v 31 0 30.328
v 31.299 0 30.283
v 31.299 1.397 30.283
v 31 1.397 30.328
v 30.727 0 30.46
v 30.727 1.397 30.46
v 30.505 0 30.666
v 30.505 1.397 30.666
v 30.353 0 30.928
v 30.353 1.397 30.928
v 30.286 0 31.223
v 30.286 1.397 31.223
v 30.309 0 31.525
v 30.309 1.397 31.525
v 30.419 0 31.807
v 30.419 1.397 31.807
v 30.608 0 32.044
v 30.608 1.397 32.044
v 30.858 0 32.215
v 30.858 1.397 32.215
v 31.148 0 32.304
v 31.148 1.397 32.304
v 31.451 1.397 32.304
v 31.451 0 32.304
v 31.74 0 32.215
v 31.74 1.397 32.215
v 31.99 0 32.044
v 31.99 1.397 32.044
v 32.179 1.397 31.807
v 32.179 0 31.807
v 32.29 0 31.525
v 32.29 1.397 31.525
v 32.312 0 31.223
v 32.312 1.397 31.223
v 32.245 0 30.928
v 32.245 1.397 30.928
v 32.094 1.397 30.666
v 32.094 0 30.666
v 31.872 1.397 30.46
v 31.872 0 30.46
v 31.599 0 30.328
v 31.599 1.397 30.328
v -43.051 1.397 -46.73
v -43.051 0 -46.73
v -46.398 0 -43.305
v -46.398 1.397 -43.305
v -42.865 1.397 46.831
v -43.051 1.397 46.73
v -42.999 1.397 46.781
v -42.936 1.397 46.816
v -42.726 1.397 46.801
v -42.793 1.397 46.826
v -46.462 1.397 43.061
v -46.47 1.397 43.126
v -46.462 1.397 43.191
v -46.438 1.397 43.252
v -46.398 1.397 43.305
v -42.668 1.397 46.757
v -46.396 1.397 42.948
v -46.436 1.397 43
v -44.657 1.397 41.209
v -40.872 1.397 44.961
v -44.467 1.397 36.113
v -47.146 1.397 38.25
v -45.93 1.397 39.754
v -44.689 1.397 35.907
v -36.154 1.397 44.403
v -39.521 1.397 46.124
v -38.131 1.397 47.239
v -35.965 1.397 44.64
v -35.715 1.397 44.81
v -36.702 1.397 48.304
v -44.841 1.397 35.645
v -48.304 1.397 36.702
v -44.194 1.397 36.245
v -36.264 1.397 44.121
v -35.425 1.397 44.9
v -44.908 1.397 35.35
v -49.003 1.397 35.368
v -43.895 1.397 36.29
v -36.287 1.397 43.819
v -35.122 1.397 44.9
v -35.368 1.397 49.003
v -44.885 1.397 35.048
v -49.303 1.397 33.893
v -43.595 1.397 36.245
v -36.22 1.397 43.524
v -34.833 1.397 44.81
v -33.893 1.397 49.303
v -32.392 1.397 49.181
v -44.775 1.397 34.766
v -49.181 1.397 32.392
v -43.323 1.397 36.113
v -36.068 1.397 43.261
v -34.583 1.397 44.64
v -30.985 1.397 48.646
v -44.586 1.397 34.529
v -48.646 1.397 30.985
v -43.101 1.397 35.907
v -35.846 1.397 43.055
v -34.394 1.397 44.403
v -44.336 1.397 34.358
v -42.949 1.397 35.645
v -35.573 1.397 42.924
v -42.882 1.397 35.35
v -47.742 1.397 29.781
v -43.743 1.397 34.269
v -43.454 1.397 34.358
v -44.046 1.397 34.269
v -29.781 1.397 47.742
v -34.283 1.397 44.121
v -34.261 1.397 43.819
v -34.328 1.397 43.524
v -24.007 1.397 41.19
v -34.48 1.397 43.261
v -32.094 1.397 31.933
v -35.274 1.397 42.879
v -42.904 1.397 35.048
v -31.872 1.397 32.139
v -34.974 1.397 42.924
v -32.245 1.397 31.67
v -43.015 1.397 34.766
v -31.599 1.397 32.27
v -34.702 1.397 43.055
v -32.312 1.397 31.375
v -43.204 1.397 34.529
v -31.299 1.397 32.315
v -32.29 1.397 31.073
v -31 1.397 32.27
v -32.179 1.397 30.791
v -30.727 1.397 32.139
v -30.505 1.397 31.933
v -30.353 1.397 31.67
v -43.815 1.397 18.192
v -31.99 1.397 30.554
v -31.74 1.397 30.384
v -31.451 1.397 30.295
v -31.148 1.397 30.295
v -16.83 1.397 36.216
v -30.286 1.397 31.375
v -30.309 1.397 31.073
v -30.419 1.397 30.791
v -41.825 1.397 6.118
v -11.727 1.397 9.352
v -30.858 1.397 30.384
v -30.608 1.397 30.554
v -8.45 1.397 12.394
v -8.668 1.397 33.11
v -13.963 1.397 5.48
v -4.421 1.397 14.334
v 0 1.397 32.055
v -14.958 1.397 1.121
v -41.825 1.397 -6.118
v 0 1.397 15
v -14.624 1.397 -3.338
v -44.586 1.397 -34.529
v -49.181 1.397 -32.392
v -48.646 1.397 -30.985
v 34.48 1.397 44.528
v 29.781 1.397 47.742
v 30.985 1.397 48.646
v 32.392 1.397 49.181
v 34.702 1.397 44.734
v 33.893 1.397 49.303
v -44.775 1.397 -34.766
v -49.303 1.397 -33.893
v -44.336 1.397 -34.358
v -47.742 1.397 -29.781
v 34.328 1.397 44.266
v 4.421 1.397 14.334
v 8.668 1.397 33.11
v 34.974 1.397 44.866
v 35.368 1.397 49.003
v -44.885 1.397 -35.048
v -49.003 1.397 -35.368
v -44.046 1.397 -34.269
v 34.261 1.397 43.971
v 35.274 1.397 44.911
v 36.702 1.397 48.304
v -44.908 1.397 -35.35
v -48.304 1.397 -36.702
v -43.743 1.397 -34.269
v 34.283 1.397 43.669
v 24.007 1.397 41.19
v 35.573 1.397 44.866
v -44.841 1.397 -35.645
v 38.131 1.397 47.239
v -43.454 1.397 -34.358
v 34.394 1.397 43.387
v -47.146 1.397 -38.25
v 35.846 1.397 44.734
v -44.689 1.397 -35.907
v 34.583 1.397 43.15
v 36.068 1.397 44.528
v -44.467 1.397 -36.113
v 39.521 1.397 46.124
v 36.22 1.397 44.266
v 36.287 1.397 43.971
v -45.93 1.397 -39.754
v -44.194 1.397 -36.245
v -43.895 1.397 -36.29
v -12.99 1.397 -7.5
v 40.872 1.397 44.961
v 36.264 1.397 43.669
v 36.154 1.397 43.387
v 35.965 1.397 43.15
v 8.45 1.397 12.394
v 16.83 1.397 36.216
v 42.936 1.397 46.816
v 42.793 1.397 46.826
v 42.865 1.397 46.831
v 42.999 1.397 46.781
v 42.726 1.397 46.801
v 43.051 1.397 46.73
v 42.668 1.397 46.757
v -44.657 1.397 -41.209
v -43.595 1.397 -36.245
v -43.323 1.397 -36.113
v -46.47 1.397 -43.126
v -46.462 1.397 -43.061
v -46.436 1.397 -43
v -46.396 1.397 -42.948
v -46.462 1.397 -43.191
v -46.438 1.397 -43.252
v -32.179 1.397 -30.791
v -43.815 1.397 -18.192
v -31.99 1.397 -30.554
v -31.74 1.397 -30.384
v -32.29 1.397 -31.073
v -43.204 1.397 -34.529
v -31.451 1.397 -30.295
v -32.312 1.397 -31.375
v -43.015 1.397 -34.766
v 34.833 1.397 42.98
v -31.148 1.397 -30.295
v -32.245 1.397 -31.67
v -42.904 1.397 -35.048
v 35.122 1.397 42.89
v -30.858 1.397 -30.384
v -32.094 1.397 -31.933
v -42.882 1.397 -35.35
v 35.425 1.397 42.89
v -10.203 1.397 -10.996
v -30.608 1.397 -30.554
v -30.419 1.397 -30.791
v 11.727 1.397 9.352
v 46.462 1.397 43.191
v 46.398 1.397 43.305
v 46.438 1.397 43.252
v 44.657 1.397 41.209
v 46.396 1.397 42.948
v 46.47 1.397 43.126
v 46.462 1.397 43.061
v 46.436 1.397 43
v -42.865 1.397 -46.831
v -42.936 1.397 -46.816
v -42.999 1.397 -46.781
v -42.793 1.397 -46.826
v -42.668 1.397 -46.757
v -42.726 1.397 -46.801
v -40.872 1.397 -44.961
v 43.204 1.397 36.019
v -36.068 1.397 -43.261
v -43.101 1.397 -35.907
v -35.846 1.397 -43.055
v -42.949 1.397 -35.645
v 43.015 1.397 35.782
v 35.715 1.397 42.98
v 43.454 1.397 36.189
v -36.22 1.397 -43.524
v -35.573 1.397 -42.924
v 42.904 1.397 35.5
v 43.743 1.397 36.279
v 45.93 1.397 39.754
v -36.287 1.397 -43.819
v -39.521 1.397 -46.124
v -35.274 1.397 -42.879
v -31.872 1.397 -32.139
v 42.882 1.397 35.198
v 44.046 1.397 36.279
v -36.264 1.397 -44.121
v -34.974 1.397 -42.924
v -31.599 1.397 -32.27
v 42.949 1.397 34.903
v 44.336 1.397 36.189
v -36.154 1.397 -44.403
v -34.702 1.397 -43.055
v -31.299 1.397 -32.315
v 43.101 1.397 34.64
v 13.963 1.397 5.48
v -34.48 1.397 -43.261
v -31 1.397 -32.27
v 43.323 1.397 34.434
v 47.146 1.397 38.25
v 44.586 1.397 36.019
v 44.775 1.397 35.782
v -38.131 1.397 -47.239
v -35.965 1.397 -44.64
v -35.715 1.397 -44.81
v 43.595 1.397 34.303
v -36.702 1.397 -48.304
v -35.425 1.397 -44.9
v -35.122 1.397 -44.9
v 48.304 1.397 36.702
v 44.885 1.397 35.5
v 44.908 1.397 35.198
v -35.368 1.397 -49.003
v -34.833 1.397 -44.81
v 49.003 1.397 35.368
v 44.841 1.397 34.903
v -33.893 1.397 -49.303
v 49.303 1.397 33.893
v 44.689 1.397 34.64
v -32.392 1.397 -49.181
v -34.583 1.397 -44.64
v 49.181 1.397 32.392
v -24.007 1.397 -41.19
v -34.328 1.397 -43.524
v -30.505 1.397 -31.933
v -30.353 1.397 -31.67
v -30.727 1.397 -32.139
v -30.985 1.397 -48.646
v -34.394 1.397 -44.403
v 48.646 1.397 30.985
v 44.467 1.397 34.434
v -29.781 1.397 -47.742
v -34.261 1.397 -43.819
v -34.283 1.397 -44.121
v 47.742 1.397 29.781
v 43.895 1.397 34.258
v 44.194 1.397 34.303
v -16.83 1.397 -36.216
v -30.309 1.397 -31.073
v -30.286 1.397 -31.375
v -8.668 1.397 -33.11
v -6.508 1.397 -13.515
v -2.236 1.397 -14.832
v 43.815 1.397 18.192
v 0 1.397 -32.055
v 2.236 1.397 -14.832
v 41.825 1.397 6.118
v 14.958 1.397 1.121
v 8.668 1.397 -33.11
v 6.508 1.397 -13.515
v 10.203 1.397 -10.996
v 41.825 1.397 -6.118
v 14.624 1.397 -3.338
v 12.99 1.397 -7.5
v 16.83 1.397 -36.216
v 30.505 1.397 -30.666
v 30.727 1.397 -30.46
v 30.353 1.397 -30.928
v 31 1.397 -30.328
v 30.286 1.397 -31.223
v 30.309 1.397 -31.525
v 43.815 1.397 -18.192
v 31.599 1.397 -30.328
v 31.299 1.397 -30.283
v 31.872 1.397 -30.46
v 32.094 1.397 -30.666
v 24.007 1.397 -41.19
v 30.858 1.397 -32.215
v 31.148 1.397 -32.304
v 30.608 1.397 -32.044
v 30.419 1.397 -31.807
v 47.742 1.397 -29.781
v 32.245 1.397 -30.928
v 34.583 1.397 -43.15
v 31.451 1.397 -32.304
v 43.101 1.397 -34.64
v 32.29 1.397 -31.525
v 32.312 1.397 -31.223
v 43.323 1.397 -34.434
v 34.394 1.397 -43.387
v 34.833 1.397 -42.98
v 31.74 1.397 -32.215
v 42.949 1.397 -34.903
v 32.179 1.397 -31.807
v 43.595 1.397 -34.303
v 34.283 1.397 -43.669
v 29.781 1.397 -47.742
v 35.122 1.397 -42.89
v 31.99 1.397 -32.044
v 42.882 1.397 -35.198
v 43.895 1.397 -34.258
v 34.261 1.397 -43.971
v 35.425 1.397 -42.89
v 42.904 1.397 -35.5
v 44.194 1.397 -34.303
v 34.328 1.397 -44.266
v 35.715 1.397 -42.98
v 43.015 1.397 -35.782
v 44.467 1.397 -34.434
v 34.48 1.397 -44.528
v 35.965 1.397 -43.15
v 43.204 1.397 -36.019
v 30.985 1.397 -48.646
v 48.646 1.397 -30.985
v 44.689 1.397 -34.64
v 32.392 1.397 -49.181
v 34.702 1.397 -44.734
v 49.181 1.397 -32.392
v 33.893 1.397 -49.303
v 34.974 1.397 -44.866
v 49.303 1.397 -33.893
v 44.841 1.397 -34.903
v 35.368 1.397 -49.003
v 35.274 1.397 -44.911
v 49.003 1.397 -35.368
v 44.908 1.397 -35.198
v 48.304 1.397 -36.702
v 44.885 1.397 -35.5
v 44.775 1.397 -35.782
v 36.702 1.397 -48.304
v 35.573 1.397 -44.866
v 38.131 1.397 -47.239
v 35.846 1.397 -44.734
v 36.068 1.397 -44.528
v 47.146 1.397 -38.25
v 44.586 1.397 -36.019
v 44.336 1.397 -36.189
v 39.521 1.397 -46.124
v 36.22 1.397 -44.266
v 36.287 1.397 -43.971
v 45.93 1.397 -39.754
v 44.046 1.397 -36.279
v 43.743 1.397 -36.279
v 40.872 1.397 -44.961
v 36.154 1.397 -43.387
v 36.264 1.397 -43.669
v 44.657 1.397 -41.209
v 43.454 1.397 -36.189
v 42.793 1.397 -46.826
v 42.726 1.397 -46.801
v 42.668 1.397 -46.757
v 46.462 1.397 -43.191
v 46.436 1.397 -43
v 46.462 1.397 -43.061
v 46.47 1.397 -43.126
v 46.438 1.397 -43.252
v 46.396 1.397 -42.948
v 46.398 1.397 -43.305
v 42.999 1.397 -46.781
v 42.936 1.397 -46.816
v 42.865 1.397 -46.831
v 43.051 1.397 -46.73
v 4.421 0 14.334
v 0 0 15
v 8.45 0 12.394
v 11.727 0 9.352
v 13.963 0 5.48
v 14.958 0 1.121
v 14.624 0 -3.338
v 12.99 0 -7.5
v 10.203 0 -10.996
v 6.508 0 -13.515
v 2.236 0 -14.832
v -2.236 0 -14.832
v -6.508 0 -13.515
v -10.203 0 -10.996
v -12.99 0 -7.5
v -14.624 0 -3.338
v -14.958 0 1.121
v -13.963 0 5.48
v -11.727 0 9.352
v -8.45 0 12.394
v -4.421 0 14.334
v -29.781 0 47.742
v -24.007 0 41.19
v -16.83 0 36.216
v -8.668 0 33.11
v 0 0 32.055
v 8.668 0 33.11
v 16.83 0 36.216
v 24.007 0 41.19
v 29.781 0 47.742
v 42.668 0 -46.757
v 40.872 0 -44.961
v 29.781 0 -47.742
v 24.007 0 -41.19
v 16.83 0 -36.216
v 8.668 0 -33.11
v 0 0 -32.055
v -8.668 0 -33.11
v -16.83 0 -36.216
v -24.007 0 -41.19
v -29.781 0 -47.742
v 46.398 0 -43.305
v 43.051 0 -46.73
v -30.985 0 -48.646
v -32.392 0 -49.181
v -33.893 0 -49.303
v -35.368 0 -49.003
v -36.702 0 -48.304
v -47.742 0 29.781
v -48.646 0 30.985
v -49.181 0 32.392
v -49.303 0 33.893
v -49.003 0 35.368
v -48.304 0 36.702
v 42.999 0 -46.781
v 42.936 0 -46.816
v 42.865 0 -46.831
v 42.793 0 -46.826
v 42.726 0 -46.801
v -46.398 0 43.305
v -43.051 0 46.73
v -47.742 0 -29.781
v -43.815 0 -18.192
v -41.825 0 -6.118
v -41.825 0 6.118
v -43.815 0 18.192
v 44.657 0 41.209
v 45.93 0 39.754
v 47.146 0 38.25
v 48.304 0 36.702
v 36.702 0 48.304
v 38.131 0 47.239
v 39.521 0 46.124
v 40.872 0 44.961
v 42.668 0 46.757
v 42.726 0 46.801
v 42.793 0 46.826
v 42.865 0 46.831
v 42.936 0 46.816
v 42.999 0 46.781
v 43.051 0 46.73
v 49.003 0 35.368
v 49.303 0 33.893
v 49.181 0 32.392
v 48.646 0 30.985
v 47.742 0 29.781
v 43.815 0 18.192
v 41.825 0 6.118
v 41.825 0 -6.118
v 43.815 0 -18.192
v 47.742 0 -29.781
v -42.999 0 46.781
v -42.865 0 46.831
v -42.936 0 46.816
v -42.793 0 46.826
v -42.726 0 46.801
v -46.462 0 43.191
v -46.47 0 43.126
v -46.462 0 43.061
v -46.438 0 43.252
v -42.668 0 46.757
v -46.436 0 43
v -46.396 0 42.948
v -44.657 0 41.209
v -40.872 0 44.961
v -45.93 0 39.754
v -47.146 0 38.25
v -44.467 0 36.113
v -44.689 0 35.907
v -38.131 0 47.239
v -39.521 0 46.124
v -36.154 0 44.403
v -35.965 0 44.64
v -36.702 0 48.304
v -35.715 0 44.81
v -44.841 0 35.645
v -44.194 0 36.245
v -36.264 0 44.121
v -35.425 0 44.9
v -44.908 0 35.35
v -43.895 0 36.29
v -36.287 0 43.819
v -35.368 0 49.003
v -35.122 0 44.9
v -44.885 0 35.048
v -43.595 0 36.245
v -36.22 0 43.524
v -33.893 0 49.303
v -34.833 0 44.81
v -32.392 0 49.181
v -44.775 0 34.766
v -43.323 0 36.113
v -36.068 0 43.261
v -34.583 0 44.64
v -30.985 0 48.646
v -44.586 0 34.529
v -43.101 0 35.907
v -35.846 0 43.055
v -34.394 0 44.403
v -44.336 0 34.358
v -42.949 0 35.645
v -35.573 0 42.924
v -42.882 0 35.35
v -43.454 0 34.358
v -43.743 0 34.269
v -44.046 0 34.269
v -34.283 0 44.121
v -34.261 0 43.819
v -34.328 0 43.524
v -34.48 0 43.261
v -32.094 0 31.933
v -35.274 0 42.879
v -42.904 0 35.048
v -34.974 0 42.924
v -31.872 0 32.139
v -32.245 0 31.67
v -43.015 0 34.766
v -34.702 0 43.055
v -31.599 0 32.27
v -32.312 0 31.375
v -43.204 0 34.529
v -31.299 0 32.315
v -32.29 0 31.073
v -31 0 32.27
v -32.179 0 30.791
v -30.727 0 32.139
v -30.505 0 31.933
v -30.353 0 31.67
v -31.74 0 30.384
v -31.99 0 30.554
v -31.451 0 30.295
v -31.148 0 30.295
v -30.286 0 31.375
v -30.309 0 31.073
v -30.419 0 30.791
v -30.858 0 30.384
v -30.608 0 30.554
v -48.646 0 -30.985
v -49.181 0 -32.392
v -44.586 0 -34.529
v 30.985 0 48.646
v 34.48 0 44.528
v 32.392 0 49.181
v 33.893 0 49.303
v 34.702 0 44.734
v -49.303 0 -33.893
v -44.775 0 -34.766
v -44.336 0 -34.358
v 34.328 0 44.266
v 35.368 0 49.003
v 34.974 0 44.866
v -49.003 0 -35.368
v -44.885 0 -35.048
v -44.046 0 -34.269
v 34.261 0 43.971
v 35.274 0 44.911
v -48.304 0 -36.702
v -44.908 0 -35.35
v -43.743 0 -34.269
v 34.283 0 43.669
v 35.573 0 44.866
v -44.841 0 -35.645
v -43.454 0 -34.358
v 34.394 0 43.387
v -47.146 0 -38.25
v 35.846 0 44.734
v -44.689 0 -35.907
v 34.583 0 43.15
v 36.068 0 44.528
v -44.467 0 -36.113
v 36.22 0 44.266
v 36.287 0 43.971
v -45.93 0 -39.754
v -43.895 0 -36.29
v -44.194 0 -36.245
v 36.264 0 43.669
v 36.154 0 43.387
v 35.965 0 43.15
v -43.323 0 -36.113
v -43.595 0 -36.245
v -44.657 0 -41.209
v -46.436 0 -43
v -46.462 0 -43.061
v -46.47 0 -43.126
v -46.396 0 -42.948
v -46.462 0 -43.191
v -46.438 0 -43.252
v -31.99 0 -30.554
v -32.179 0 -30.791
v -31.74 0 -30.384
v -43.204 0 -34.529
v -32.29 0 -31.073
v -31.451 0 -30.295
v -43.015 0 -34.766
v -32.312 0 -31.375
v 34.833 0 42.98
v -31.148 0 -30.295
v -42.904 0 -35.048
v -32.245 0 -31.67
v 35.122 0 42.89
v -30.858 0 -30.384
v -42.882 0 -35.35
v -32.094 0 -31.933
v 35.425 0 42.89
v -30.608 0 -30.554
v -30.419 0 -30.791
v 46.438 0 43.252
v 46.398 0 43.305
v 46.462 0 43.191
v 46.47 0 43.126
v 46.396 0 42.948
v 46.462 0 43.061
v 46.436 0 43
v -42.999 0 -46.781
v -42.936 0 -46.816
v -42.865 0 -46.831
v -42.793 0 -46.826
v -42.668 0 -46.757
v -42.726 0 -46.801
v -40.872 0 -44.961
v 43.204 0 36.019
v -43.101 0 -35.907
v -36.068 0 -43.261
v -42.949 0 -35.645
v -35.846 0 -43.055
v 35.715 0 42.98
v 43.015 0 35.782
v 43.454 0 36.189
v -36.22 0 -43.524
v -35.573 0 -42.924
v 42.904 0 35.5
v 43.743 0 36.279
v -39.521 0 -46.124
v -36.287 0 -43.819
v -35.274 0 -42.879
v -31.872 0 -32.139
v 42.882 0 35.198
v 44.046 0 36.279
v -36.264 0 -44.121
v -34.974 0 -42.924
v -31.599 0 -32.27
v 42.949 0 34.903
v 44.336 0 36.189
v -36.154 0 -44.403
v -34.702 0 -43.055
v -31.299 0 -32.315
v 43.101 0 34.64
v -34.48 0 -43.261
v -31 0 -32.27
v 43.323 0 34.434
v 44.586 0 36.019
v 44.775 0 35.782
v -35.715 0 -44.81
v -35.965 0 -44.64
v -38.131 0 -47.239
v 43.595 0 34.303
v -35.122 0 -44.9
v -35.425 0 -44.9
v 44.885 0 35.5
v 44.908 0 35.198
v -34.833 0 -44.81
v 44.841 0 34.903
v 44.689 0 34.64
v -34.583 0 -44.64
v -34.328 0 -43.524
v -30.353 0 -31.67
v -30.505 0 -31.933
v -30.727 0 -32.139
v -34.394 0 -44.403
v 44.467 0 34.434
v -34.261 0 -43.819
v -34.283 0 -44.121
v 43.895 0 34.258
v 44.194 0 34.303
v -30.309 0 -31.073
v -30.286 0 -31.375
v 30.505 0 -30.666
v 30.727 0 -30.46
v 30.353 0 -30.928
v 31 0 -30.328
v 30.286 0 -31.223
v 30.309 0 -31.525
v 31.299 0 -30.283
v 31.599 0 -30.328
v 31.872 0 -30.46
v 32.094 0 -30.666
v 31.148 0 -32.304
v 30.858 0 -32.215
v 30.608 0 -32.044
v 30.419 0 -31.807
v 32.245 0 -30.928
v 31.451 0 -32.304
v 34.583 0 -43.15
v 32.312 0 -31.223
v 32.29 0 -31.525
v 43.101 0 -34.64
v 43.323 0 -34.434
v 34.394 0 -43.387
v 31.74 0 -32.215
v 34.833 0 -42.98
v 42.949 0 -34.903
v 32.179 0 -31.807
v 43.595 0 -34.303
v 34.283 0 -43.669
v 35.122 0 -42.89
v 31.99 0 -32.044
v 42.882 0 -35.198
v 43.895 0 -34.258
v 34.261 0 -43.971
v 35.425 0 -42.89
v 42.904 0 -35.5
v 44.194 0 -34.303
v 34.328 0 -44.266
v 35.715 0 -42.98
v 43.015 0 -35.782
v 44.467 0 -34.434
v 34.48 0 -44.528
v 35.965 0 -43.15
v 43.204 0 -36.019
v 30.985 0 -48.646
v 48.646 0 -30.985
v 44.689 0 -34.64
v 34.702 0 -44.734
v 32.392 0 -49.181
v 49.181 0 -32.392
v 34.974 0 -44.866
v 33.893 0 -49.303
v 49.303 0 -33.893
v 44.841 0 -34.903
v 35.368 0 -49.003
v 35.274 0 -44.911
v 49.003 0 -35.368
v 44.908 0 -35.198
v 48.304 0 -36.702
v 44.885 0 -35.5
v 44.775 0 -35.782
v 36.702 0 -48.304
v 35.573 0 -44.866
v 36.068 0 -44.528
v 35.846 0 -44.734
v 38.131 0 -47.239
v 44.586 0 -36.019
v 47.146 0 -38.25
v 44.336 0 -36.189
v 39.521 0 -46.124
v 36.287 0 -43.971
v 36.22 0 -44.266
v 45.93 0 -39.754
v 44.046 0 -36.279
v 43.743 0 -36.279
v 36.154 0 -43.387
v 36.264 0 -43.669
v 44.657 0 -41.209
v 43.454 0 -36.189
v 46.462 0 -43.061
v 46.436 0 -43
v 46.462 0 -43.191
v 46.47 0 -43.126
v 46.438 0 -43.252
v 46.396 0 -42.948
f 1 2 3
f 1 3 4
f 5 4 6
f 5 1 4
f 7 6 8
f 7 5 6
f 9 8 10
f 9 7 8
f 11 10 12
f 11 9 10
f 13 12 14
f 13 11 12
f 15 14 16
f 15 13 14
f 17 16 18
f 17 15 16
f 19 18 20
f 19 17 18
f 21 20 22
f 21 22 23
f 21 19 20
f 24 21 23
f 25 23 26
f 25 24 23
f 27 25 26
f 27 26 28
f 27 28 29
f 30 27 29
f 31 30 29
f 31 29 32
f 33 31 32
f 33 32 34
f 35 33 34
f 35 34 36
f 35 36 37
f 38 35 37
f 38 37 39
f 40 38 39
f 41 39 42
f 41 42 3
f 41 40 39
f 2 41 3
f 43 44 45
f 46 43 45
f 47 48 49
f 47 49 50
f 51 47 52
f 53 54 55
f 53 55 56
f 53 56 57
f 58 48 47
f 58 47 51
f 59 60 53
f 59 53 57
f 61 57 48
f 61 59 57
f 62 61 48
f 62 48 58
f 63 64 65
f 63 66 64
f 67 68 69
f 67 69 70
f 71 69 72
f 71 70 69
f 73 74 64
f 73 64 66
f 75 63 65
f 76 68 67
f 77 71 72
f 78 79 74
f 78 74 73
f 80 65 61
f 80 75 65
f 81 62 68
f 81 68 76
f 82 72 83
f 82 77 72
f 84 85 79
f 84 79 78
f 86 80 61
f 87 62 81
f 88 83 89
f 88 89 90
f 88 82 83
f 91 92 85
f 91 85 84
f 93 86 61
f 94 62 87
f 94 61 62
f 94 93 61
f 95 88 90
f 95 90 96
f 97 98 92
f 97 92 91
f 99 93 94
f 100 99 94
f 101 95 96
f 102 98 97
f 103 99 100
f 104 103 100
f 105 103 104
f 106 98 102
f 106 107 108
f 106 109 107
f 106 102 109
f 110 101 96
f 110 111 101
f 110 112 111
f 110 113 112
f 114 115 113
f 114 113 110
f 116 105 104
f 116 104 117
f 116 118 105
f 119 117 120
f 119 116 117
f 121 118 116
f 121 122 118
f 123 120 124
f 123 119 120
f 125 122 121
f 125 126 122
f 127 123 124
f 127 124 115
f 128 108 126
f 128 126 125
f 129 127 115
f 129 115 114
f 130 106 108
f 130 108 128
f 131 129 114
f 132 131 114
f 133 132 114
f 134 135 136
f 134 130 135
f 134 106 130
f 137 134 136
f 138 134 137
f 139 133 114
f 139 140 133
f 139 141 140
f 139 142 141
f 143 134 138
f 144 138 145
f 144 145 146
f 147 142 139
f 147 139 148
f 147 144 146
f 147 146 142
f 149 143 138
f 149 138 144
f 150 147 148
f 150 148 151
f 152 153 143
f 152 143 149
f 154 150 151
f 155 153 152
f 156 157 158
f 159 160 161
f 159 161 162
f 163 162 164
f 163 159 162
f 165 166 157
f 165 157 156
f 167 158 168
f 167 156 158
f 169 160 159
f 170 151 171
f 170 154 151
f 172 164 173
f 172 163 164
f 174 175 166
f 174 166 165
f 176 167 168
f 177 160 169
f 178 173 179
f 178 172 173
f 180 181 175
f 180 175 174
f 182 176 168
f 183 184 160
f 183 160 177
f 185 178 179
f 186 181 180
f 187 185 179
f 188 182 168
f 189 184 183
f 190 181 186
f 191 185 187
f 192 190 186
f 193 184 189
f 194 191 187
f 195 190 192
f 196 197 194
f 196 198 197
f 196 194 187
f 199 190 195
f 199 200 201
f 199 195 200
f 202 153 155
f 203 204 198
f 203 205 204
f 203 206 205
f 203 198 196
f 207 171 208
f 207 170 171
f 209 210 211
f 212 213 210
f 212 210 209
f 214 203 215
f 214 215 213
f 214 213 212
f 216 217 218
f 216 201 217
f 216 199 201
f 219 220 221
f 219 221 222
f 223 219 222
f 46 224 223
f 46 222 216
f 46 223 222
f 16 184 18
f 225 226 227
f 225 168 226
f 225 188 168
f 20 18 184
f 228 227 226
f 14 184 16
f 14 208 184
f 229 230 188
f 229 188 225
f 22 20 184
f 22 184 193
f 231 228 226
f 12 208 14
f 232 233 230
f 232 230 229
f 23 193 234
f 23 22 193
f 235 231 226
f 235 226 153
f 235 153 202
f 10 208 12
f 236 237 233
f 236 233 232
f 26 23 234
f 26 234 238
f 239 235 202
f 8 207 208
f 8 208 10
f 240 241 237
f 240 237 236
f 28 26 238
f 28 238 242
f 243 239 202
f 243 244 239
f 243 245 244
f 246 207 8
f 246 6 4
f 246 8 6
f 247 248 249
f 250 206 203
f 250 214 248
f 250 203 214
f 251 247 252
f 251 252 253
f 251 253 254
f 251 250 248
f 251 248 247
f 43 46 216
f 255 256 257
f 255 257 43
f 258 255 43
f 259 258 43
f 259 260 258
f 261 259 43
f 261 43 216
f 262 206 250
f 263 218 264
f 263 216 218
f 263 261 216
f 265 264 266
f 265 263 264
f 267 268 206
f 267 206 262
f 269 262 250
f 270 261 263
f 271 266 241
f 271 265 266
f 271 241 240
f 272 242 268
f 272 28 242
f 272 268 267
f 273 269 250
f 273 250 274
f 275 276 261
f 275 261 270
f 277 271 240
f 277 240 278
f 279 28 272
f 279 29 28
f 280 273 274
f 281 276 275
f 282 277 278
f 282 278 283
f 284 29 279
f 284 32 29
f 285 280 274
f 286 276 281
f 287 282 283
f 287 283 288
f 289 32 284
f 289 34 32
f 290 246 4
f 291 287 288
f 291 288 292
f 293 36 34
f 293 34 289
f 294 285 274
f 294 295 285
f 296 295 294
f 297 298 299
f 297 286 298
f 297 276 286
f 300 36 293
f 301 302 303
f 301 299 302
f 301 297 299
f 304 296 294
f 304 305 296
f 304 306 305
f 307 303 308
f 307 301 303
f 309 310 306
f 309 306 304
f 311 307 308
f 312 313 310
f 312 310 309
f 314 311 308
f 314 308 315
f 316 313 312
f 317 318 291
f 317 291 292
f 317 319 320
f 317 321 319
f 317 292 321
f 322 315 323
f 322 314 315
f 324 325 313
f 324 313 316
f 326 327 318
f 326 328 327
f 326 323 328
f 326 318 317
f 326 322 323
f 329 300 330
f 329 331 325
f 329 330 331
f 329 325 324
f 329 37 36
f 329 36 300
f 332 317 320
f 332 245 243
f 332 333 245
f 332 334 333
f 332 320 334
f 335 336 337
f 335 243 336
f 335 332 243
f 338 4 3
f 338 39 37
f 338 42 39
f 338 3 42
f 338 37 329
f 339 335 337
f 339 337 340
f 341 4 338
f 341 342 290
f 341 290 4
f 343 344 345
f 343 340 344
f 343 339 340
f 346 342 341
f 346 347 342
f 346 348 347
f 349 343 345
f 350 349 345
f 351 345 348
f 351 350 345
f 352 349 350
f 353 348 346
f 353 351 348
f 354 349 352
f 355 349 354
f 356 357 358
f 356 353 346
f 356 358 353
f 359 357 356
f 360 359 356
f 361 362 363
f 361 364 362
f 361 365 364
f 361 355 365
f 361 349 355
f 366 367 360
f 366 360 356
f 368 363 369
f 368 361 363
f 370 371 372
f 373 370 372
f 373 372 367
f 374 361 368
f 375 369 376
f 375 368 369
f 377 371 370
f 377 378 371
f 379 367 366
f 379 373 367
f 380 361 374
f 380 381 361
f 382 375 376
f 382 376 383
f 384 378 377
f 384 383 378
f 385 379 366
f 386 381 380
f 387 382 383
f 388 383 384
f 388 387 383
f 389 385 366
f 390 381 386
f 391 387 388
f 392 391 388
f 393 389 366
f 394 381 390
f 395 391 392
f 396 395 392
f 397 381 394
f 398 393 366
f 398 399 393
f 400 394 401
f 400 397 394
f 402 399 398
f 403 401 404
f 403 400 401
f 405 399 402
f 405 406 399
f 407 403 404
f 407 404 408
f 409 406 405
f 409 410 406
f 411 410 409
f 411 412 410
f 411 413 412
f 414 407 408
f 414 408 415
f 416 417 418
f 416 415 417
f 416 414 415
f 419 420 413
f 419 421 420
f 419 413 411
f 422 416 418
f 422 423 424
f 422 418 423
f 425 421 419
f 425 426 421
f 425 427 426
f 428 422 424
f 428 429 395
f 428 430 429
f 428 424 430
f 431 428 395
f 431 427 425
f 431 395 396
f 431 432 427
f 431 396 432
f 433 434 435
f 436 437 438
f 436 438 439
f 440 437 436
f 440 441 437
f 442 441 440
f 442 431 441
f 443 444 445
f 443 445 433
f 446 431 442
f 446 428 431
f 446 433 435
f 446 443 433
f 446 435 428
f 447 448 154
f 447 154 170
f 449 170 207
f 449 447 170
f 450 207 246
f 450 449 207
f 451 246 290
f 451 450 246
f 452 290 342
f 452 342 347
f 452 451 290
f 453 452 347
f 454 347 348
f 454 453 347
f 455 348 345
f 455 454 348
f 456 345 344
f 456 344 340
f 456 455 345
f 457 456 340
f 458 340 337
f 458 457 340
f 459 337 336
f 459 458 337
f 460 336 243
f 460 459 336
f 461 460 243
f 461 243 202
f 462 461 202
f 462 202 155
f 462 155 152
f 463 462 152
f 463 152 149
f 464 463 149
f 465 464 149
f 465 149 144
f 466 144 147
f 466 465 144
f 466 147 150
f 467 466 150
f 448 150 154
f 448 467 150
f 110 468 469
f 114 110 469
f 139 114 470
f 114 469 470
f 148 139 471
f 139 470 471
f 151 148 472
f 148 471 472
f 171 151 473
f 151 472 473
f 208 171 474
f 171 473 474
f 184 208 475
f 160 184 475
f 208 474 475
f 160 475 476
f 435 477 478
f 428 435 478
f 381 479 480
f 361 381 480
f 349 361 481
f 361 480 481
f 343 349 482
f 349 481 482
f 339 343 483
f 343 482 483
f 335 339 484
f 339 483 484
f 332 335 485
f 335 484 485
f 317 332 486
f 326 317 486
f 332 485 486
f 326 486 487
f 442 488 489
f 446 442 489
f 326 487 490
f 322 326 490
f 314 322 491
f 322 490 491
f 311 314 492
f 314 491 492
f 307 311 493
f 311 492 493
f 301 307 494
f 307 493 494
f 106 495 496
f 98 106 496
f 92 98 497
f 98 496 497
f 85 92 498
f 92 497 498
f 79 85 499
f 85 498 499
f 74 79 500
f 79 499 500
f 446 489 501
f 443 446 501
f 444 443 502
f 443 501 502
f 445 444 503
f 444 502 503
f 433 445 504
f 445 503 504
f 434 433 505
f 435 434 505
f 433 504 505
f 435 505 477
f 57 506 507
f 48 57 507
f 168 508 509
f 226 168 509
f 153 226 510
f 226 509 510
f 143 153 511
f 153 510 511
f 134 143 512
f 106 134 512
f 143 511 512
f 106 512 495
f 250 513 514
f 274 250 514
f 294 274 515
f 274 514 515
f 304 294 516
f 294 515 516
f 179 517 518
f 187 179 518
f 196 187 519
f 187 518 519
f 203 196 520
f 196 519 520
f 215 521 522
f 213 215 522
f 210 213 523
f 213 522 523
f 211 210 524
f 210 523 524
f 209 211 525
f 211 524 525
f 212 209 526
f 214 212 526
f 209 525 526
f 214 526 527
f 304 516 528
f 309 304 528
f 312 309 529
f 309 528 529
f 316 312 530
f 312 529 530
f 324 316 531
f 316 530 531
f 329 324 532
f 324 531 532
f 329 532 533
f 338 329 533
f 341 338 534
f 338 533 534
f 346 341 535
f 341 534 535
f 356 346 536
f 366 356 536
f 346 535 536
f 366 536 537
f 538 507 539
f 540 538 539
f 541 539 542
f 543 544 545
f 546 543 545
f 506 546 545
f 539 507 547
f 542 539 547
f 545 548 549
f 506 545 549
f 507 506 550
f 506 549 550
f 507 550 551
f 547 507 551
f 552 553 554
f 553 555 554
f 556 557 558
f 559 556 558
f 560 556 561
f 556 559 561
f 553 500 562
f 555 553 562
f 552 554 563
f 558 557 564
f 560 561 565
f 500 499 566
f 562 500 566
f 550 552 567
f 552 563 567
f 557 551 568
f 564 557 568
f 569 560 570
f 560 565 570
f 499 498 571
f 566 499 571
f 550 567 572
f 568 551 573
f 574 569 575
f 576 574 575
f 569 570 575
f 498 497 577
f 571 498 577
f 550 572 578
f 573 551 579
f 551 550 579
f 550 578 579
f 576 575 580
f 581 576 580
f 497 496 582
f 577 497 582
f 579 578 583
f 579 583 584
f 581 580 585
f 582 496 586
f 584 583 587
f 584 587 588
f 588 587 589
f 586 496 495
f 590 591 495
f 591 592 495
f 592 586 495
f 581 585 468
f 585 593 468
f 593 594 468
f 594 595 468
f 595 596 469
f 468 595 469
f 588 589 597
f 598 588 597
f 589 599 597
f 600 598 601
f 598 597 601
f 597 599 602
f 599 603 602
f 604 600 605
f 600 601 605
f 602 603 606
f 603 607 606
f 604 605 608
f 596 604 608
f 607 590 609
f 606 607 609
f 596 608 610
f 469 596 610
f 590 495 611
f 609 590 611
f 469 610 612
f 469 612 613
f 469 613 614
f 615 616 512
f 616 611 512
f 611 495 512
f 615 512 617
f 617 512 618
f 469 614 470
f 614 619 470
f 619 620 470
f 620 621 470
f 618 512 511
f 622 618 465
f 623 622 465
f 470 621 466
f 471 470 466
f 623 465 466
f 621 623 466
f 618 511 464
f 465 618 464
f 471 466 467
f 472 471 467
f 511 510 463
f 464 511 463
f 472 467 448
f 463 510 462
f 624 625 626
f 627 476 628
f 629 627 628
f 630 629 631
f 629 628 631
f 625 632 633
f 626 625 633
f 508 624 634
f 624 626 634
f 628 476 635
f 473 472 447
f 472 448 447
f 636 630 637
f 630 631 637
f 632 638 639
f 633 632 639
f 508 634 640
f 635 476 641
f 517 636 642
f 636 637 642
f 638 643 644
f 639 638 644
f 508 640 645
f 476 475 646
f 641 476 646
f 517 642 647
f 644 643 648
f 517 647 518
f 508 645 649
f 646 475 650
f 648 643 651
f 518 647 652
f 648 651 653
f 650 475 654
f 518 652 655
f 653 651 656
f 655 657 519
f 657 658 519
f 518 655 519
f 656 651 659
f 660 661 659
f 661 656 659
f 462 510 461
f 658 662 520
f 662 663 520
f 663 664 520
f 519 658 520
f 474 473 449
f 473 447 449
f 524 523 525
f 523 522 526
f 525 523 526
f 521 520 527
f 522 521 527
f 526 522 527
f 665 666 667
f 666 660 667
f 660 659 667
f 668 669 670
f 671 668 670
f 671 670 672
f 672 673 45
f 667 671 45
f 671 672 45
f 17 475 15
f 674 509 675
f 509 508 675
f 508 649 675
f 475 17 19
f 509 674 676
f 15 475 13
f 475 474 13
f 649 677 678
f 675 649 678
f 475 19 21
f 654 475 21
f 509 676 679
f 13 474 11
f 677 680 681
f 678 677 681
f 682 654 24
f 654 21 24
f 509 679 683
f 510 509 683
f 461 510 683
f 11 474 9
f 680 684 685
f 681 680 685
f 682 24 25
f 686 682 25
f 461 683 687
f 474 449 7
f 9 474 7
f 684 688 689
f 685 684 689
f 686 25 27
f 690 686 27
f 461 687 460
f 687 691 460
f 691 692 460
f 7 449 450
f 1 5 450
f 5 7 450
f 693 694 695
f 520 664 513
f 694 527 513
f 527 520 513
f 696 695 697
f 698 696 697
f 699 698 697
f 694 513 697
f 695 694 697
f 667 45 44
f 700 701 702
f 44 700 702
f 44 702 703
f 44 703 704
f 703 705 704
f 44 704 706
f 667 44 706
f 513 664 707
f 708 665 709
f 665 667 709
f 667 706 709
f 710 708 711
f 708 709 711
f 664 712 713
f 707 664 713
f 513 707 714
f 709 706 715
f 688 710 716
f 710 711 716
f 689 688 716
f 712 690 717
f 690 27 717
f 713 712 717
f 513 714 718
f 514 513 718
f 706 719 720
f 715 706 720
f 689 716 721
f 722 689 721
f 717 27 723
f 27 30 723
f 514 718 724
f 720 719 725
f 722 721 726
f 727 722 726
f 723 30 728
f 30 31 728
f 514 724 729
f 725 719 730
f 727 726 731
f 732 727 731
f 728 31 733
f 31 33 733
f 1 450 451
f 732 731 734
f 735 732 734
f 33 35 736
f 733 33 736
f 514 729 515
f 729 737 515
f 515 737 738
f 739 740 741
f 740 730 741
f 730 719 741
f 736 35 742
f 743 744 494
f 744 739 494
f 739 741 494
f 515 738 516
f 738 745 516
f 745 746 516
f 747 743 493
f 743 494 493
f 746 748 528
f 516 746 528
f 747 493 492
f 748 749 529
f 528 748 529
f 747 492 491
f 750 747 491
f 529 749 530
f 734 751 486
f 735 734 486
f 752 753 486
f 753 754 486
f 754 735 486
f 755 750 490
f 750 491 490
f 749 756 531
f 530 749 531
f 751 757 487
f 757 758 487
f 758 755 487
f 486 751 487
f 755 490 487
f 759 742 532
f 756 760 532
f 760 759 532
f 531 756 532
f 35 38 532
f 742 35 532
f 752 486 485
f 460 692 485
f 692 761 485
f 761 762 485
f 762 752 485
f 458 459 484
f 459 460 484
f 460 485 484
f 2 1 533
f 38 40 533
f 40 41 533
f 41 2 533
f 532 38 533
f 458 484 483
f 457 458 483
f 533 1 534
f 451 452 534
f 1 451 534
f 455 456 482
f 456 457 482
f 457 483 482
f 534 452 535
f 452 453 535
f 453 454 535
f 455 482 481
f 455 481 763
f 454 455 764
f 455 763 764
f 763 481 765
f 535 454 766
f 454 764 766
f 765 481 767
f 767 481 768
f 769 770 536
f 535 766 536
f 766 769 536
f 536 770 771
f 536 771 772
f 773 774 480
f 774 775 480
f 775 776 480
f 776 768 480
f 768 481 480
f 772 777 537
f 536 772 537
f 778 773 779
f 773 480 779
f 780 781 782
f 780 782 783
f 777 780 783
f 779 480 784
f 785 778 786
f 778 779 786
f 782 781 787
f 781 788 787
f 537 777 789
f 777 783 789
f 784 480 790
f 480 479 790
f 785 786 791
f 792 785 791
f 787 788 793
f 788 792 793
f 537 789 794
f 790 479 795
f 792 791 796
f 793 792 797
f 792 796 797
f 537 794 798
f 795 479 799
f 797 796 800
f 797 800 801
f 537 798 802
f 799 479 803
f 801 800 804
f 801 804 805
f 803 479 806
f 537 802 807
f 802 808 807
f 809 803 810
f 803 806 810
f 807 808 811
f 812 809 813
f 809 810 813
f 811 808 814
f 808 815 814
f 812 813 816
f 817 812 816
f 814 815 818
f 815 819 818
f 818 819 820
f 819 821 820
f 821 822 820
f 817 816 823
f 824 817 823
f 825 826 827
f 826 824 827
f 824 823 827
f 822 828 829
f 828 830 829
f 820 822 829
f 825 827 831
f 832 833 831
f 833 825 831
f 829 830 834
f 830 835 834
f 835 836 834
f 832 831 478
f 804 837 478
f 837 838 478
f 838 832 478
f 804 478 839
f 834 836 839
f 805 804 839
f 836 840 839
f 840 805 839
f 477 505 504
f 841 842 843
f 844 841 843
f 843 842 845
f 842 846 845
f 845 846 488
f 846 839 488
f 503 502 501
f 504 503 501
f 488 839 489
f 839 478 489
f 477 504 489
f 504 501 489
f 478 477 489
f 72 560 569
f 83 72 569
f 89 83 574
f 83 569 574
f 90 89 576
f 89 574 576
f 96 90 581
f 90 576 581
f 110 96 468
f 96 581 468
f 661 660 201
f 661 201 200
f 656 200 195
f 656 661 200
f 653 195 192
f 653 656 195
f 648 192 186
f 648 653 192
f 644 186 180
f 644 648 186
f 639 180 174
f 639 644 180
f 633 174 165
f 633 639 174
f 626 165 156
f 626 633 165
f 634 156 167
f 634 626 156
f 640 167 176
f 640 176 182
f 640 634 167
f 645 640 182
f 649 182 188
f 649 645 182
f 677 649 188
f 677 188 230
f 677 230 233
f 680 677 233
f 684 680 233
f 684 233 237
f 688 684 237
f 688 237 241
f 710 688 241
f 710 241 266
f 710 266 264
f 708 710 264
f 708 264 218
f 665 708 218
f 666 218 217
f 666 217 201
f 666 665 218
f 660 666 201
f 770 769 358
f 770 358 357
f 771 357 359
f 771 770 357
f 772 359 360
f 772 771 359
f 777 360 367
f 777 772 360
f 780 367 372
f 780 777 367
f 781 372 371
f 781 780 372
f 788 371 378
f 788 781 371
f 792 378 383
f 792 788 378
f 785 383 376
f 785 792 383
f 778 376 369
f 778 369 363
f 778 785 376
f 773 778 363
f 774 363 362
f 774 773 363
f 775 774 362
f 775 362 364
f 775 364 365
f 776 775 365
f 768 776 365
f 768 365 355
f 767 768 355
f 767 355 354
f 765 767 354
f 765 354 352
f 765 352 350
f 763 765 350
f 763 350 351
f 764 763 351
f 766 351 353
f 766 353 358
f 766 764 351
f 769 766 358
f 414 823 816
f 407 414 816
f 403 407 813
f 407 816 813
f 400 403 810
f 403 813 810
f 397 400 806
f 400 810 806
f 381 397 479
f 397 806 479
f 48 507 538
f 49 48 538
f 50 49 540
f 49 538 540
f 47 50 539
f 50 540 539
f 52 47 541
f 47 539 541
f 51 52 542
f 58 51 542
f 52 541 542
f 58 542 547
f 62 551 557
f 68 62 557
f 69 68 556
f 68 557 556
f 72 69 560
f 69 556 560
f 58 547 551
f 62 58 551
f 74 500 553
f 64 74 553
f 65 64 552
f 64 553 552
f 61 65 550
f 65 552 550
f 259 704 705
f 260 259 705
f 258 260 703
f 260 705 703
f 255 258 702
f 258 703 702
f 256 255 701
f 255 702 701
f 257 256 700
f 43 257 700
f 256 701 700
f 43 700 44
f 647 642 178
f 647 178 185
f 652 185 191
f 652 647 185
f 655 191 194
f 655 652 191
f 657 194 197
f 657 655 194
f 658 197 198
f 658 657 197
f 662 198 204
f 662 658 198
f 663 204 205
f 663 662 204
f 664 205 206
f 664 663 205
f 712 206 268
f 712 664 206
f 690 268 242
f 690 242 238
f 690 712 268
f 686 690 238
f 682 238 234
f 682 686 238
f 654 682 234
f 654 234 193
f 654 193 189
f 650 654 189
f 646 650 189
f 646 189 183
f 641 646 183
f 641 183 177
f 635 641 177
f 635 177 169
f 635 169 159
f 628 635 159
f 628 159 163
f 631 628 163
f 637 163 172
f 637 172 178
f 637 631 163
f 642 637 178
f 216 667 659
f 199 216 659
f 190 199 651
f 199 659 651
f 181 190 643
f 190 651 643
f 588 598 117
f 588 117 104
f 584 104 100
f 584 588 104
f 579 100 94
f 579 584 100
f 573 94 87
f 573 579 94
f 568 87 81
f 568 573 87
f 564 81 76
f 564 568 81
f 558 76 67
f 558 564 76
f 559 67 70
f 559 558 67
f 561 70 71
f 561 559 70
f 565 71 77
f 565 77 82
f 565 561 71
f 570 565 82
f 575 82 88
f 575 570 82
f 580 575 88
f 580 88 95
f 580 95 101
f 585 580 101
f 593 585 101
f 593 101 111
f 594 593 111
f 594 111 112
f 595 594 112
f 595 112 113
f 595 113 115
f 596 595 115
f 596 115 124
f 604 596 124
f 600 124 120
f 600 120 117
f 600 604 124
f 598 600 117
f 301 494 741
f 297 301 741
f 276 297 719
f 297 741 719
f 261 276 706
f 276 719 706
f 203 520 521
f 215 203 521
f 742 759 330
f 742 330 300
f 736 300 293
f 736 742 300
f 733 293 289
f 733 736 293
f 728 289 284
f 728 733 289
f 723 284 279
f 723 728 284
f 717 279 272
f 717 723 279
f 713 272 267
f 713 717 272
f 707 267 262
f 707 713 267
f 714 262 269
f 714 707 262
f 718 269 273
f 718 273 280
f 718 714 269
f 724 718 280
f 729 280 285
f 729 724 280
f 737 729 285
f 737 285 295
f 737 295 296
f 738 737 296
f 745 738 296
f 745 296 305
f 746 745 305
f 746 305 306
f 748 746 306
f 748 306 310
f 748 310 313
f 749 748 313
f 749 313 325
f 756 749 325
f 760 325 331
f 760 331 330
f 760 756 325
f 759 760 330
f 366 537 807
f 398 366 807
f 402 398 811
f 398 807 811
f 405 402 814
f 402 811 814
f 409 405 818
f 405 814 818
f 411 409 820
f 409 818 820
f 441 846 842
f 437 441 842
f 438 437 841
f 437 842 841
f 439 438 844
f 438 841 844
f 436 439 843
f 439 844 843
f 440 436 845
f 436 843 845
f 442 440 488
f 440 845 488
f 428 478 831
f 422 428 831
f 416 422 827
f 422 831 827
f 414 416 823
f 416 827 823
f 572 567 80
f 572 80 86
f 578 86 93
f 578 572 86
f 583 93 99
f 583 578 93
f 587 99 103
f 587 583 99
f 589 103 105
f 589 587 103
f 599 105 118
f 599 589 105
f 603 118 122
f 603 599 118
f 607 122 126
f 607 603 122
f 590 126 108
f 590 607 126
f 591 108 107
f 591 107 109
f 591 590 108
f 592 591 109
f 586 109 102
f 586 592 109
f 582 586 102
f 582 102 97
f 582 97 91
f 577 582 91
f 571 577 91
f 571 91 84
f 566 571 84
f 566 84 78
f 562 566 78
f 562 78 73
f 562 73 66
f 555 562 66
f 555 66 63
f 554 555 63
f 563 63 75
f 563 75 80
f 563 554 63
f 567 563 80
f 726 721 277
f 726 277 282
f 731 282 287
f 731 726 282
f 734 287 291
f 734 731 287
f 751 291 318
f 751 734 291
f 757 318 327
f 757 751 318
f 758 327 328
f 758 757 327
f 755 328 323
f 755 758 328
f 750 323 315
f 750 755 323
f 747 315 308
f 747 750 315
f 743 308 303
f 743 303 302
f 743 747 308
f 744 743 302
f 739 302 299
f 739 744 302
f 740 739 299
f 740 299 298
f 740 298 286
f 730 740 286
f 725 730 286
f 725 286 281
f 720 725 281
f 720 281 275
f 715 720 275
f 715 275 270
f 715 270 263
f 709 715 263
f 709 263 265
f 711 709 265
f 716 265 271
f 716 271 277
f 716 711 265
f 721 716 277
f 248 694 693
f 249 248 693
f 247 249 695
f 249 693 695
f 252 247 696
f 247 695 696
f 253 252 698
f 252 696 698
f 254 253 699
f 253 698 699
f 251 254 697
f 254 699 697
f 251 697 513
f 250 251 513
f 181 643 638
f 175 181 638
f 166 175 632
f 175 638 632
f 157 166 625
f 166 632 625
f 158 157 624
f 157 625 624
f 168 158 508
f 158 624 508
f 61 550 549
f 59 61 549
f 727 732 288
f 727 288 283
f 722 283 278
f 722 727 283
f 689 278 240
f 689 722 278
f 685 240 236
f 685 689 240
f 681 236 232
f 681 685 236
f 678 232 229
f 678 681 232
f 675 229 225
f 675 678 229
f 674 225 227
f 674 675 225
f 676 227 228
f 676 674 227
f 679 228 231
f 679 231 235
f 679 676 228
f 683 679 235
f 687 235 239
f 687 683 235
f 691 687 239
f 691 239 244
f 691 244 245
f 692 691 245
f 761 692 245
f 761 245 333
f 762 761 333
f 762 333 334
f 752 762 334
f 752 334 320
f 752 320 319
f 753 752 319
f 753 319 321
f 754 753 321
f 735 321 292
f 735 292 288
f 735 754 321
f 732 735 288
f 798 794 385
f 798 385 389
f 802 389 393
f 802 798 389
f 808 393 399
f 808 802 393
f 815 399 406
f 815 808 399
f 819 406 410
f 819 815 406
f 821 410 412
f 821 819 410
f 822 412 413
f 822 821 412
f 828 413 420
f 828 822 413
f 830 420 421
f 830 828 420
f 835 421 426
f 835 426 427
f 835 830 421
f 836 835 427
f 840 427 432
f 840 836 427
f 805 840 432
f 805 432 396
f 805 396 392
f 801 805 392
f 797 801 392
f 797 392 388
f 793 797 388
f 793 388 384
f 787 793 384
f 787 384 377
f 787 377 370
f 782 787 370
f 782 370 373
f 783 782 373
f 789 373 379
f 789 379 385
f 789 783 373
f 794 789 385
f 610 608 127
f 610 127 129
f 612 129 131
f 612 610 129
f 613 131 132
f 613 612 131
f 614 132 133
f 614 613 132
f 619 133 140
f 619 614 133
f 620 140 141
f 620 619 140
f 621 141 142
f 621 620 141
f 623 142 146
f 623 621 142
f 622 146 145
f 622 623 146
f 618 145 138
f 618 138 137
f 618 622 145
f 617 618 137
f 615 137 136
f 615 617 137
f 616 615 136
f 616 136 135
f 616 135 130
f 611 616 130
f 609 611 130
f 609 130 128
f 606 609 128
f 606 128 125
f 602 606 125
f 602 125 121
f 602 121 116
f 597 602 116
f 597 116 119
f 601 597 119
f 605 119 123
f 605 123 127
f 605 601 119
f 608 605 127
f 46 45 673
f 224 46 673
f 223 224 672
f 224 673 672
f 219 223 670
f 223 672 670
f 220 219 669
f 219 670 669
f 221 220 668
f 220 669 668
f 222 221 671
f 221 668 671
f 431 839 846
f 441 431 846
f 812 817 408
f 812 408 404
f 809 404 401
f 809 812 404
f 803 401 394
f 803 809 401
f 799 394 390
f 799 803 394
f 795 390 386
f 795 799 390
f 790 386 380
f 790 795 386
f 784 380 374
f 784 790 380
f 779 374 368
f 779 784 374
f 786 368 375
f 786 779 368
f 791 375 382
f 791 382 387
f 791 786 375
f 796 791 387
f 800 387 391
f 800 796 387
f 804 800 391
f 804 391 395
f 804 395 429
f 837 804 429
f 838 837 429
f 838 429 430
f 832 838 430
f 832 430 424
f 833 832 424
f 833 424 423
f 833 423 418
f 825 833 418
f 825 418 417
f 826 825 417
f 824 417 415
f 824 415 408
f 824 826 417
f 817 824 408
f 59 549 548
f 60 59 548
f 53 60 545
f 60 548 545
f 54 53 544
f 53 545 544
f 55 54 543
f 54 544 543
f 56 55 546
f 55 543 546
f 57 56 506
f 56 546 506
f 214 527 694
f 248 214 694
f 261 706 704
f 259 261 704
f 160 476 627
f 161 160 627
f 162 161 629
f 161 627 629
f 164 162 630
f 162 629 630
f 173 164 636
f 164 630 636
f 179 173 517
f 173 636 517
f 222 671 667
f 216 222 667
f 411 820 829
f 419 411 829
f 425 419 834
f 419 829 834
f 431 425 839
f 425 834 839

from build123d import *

# Parameters (mm, degrees)
SKETCH1_R           = 1.015999988
SKETCH1_R_2         = 15
BOSS_EXTRUDE1_DEPTH = 1.397


with BuildPart() as part:
    # Sketch1 → Boss-Extrude1 (new body)
    with BuildSketch(Plane(origin=(0, 0, 0), x_dir=(1, 0, 0), z_dir=(0, 1, 0))):
        with BuildLine():
            Line((-44.657487237, -41.209177315), (-46.396043567, -42.947733627))
            ThreePointArc((-46.396043567, -42.947733627), (-46.470434262, -43.125880964), (-46.398093323, -43.304870453))
            Line((-46.398093323, -43.304870453), (-43.050556802, -46.730153525))
            ThreePointArc((-43.050556802, -46.730153525), (-42.865374815, -46.831022568), (-42.667823867, -46.757262447))
            Line((-42.667823867, -46.757262447), (-40.871772634, -44.961211232))
            ThreePointArc((-40.871772634, -44.961211232), (-38.831009245, -46.687575098), (-36.702263685, -48.30420423))
            ThreePointArc((-36.702263685, -48.30420423), (-33.138347002, -49.294565873), (-29.78114627, -47.741658512))
            ThreePointArc((-29.78114627, -47.741658512), (0, -32.054645119), (29.78114627, -47.741658512))
            ThreePointArc((29.78114627, -47.741658512), (33.138347002, -49.294565873), (36.702263685, -48.30420423))
            ThreePointArc((36.702263685, -48.30420423), (38.831009245, -46.687575098), (40.871772634, -44.961211232))
            Line((40.871772634, -44.961211232), (42.667823867, -46.757262447))
            ThreePointArc((42.667823867, -46.757262447), (42.865374815, -46.831022568), (43.050556802, -46.730153525))
            Line((43.050556802, -46.730153525), (46.398093323, -43.304870453))
            ThreePointArc((46.398093323, -43.304870453), (46.470434262, -43.125880964), (46.396043567, -42.947733627))
            Line((46.396043567, -42.947733627), (44.657487237, -41.209177315))
            ThreePointArc((44.657487237, -41.209177315), (46.545191357, -39.007785017), (48.30420423, -36.702263685))
            ThreePointArc((48.30420423, -36.702263685), (49.294565905, -33.13834702), (47.741658512, -29.78114627))
            ThreePointArc((47.741658512, -29.78114627), (41.575395348, 0), (47.741658512, 29.78114627))
            ThreePointArc((47.741658512, 29.78114627), (49.294565905, 33.13834702), (48.30420423, 36.702263685))
            ThreePointArc((48.30420423, 36.702263685), (46.545191357, 39.007785017), (44.657487237, 41.209177315))
            Line((44.657487237, 41.209177315), (46.396043567, 42.947733627))
            ThreePointArc((46.396043567, 42.947733627), (46.470434262, 43.125880964), (46.398093323, 43.304870453))
            Line((46.398093323, 43.304870453), (43.050556802, 46.730153525))
            ThreePointArc((43.050556802, 46.730153525), (42.865374815, 46.831022568), (42.667823867, 46.757262447))
            Line((42.667823867, 46.757262447), (40.871772634, 44.961211232))
            ThreePointArc((40.871772634, 44.961211232), (38.831009245, 46.687575098), (36.702263685, 48.30420423))
            ThreePointArc((36.702263685, 48.30420423), (33.138347002, 49.294565873), (29.78114627, 47.741658512))
            ThreePointArc((29.78114627, 47.741658512), (0, 32.054645119), (-29.78114627, 47.741658512))
            ThreePointArc((-29.78114627, 47.741658512), (-33.138347002, 49.294565873), (-36.702263685, 48.30420423))
            ThreePointArc((-36.702263685, 48.30420423), (-38.831009245, 46.687575098), (-40.871772634, 44.961211232))
            Line((-40.871772634, 44.961211232), (-42.667823867, 46.757262447))
            ThreePointArc((-42.667823867, 46.757262447), (-42.865374815, 46.831022568), (-43.050556802, 46.730153525))
            Line((-43.050556802, 46.730153525), (-46.398093323, 43.304870453))
            ThreePointArc((-46.398093323, 43.304870453), (-46.470434262, 43.125880964), (-46.396043567, 42.947733627))
            Line((-46.396043567, 42.947733627), (-44.657487237, 41.209177315))
            ThreePointArc((-44.657487237, 41.209177315), (-46.545191357, 39.007785017), (-48.30420423, 36.702263685))
            ThreePointArc((-48.30420423, 36.702263685), (-49.294565905, 33.13834702), (-47.741658512, 29.78114627))
            ThreePointArc((-47.741658512, 29.78114627), (-41.575395348, 0), (-47.741658512, -29.78114627))
            ThreePointArc((-47.741658512, -29.78114627), (-49.294565905, -33.13834702), (-48.30420423, -36.702263685))
            ThreePointArc((-48.30420423, -36.702263685), (-46.545191357, -39.007785017), (-44.657487237, -41.209177315))
        make_face()
        with Locations(Location((-35.273880272, -43.89492624, 0), (0, 0, 90))):
            Circle(SKETCH1_R, mode=Mode.SUBTRACT)
        with Locations(Location((-43.894926149, -35.273880364, 0), (0, 0, 270))):
            Circle(SKETCH1_R, mode=Mode.SUBTRACT)
        with Locations(Location((-31.299173944, -31.299174035, 0), (0, 0, 270))):
            Circle(SKETCH1_R, mode=Mode.SUBTRACT)
        with Locations(Location((43.894926149, -35.273880364, 0), (0, 0, 90))):
            Circle(SKETCH1_R, mode=Mode.SUBTRACT)
        with Locations(Location((35.273880272, -43.89492624, 0), (0, 0, 270))):
            Circle(SKETCH1_R, mode=Mode.SUBTRACT)
        with Locations(Location((31.299173944, -31.299174035, 0), (0, 0, 90))):
            Circle(SKETCH1_R, mode=Mode.SUBTRACT)
        with Locations(Location((-35.273880272, 43.89492624, 0), (0, 0, 270))):
            Circle(SKETCH1_R, mode=Mode.SUBTRACT)
        with Locations(Location((-31.299173944, 31.299174035, 0), (0, 0, 90))):
            Circle(SKETCH1_R, mode=Mode.SUBTRACT)
        with Locations(Location((-43.894926149, 35.273880364, 0), (0, 0, 90))):
            Circle(SKETCH1_R, mode=Mode.SUBTRACT)
        with Locations(Location((43.894926149, 35.273880364, 0), (0, 0, 270))):
            Circle(SKETCH1_R, mode=Mode.SUBTRACT)
        with Locations(Location((35.273880272, 43.89492624, 0), (0, 0, 90))):
            Circle(SKETCH1_R, mode=Mode.SUBTRACT)
        with Locations(Location((31.299173944, 31.299174035, 0), (0, 0, 270))):
            Circle(SKETCH1_R, mode=Mode.SUBTRACT)
        with Locations(Location((0, 0, 0), (0, 0, 270))):
            Circle(SKETCH1_R_2, mode=Mode.SUBTRACT)
    extrude(amount=BOSS_EXTRUDE1_DEPTH)


solid = part.part
